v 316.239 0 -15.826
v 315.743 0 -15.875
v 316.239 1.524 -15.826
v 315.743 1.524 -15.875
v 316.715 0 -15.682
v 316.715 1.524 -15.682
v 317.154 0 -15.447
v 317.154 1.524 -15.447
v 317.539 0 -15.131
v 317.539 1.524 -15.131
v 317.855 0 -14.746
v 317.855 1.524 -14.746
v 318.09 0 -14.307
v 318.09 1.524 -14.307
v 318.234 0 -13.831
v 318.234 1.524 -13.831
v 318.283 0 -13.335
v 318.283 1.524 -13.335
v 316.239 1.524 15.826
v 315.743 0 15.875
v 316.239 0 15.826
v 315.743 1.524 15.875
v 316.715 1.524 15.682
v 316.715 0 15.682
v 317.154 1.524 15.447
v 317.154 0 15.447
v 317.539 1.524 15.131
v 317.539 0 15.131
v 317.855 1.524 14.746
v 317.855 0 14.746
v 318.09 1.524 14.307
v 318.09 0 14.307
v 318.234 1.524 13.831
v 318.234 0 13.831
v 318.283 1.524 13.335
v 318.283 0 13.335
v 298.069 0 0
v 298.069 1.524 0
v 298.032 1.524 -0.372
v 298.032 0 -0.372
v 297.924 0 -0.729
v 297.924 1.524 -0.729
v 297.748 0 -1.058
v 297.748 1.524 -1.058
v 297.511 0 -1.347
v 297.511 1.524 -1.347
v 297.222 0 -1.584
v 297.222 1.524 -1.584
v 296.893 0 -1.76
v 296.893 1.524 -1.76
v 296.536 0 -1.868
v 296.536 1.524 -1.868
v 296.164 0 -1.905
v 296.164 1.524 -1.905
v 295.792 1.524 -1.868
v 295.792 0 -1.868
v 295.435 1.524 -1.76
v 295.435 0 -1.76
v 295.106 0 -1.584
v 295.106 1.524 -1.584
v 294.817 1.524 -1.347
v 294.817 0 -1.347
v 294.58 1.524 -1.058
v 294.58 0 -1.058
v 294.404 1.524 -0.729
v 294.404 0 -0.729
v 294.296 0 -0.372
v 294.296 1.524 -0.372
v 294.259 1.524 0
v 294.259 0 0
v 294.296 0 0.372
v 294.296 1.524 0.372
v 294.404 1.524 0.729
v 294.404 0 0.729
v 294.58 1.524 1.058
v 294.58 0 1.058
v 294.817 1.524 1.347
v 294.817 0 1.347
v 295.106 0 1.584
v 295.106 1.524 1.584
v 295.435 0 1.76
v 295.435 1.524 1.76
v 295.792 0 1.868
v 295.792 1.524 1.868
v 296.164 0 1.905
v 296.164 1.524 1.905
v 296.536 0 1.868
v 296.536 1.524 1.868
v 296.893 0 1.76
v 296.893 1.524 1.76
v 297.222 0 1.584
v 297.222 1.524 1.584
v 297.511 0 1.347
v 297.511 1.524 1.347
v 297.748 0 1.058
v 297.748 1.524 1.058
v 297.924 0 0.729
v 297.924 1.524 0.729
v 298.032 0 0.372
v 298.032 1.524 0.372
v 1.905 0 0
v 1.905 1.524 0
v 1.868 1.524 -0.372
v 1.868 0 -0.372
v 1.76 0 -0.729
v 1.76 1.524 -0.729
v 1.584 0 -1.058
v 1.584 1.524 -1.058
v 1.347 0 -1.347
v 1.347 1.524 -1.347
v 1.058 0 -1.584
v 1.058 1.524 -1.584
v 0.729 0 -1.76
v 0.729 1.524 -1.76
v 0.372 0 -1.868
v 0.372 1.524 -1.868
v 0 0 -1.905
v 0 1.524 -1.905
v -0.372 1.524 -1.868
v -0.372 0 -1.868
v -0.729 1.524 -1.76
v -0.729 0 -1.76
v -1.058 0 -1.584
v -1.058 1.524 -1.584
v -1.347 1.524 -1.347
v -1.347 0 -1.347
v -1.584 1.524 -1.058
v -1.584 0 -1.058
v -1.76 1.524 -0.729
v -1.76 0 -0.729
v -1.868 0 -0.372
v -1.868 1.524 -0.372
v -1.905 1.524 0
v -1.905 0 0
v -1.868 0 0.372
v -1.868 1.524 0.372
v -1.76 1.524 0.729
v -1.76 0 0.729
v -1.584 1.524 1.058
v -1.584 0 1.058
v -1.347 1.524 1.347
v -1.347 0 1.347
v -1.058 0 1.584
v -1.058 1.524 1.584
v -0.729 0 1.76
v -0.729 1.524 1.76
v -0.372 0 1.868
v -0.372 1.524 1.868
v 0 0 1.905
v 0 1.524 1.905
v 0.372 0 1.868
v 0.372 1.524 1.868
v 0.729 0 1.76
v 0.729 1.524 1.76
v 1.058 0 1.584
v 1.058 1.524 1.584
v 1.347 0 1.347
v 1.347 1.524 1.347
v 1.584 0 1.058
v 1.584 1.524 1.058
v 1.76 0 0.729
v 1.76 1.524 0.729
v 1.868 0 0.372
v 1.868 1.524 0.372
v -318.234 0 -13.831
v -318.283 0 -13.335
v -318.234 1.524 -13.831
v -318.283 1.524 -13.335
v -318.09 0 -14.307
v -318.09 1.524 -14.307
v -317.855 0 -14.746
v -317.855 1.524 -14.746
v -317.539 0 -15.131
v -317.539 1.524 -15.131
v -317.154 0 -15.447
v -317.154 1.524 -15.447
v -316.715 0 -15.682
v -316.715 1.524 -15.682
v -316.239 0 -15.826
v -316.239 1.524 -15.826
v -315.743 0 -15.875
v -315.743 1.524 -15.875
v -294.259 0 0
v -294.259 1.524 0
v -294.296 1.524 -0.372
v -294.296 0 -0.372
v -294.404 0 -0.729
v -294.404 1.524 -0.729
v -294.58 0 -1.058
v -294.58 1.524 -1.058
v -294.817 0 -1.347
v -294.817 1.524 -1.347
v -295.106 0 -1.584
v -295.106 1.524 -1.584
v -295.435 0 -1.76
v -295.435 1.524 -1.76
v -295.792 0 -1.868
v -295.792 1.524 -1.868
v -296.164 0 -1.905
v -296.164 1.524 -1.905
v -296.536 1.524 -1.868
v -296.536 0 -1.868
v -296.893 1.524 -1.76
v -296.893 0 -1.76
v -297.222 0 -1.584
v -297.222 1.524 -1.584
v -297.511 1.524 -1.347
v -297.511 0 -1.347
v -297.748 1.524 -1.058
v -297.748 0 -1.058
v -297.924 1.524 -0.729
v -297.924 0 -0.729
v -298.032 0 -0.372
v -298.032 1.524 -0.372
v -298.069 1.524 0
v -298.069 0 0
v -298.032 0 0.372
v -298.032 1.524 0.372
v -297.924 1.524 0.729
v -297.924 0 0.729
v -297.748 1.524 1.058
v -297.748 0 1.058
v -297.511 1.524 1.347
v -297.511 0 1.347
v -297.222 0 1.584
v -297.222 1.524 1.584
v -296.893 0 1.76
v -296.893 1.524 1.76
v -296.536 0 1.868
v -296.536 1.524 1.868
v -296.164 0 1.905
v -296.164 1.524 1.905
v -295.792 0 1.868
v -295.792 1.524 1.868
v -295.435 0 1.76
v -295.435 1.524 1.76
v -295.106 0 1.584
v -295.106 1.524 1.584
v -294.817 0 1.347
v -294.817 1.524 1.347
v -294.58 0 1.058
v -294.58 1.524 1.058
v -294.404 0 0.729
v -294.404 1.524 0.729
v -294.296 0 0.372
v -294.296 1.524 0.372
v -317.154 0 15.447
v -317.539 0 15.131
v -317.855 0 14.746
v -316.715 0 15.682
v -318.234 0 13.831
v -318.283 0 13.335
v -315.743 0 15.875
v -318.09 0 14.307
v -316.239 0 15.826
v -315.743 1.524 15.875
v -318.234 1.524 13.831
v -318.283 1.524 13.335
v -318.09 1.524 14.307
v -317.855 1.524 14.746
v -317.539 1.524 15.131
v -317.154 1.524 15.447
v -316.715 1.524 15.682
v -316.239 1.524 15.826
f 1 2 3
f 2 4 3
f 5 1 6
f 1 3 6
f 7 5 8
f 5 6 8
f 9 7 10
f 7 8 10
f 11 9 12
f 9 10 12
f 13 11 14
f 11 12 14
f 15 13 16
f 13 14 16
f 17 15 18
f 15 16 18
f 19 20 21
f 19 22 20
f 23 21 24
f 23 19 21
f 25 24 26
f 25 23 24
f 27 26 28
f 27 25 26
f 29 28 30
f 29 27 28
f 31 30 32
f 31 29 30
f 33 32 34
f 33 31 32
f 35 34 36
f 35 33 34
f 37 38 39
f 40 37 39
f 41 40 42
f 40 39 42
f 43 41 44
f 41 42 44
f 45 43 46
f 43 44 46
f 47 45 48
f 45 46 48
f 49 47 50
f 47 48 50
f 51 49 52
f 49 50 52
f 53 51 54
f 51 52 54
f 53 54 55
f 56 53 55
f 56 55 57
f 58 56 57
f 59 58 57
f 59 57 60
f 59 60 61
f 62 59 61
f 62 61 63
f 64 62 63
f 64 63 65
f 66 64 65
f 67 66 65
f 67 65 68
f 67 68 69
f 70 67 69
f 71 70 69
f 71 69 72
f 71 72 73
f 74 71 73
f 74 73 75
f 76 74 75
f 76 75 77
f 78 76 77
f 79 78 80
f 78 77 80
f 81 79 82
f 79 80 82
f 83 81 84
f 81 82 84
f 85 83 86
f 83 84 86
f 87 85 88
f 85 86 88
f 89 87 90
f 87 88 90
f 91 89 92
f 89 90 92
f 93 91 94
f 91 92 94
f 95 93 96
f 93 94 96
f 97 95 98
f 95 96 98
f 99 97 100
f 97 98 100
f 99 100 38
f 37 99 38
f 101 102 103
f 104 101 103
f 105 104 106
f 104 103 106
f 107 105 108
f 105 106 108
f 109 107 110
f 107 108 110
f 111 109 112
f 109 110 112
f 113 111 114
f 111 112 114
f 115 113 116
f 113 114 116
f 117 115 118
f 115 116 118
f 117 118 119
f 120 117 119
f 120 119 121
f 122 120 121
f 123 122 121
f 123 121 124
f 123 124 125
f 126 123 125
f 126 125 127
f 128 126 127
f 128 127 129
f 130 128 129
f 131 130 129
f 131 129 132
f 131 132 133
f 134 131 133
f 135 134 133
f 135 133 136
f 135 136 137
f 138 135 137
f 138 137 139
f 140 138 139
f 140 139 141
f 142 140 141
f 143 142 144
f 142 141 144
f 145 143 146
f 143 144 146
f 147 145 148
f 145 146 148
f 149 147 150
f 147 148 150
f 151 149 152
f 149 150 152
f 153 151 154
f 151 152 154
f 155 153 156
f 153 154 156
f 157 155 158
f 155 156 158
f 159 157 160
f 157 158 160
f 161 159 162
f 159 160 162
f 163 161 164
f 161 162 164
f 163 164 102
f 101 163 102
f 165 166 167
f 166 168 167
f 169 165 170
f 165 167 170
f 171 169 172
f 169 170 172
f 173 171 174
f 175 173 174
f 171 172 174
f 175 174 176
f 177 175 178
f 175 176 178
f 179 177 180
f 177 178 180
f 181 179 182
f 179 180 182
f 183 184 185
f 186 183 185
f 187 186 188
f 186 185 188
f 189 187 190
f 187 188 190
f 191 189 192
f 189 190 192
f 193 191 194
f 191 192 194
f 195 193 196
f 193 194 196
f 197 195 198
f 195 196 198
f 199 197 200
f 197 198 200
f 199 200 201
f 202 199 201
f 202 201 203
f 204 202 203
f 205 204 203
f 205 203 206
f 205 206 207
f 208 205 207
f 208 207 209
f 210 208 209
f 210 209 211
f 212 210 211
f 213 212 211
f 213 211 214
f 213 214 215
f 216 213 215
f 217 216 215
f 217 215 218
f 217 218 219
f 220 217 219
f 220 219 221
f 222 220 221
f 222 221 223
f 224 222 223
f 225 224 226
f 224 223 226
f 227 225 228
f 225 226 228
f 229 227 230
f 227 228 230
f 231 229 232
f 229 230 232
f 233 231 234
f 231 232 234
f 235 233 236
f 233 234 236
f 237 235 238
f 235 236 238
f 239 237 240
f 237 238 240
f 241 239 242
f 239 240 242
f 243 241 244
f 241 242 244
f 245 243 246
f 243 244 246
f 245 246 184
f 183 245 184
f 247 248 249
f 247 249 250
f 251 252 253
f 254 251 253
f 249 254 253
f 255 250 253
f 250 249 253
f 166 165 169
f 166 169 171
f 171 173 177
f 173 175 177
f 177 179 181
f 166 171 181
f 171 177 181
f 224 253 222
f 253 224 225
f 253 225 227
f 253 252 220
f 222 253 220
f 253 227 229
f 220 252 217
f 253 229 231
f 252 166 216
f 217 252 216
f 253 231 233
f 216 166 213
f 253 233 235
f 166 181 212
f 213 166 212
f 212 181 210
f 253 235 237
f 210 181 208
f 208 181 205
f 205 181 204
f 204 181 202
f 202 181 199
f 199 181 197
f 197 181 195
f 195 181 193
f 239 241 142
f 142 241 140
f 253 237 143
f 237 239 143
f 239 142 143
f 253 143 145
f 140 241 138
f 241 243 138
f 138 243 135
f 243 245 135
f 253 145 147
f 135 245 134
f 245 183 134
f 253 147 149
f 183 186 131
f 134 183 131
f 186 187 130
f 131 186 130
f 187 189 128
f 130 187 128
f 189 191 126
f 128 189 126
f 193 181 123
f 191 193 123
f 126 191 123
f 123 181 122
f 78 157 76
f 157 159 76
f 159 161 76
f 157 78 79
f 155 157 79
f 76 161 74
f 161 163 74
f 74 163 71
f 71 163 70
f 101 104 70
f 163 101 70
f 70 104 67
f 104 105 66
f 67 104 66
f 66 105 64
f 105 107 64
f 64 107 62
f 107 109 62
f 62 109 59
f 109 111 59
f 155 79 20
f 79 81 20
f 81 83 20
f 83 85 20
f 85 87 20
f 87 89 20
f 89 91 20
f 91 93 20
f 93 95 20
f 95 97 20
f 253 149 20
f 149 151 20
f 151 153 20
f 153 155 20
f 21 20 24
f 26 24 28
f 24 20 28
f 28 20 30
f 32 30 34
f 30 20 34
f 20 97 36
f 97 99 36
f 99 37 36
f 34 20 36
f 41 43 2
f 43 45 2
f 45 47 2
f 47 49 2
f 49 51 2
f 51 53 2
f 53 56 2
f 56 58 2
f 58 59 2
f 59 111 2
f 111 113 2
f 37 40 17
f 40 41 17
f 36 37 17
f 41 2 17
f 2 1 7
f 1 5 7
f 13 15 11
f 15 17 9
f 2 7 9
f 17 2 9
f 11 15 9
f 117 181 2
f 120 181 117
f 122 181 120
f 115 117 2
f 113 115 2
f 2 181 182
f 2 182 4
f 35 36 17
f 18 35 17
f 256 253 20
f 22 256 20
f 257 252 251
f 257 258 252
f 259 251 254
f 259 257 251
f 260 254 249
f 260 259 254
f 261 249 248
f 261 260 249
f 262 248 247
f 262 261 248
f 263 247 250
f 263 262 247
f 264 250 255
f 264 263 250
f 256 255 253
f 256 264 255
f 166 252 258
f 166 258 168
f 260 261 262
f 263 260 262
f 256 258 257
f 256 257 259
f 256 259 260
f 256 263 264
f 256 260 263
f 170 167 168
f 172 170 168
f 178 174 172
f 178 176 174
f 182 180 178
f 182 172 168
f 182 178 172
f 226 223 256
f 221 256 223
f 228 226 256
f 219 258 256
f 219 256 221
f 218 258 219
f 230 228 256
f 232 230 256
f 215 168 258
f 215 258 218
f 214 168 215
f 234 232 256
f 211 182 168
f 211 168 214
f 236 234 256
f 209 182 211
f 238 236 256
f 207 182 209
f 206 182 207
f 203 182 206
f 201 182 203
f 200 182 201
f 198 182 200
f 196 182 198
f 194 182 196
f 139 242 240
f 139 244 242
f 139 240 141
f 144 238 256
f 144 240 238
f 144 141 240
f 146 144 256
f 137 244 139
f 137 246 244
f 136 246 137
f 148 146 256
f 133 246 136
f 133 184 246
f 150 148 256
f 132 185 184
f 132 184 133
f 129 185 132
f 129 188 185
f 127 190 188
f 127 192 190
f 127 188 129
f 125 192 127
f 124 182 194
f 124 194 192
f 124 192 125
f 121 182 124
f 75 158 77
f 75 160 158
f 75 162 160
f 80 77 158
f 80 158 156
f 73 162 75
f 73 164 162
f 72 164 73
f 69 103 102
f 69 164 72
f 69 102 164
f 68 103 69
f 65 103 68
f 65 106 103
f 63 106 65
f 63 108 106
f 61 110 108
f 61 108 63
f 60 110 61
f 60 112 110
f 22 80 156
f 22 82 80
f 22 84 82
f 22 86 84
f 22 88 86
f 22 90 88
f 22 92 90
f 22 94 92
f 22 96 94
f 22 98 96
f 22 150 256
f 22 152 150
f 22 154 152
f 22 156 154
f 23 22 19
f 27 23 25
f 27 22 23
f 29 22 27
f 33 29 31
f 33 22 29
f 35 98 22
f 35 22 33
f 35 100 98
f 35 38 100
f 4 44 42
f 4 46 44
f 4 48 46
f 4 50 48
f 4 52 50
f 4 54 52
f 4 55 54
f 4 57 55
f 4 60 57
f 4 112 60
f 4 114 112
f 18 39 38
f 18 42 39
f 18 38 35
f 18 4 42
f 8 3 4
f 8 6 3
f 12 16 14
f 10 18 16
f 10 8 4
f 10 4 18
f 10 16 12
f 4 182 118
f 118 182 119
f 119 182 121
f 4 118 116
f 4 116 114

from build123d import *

# Parameters (mm, degrees)
SKETCH1_W           = 636.566333418
SKETCH1_H           = 31.75
BOSS_EXTRUDE1_DEPTH = 1.524
SKETCH2_R           = 1.905
CUT_EXTRUDE1_DEPTH  = 2.524
FILLET1_R           = 2.54


with BuildPart() as part:
    # Sketch1 → Boss-Extrude1 (new body)
    with BuildSketch(Plane(origin=(0, 0, 0), x_dir=(1, 0, 0), z_dir=(0, 1, 0))):
        Rectangle(SKETCH1_W, SKETCH1_H)
    extrude(amount=BOSS_EXTRUDE1_DEPTH)

    # Sketch2 → Cut-Extrude1 (cut, through all)
    with BuildSketch(Plane(origin=(0, 1.524, 0), x_dir=(1, 0, 0), z_dir=(0, 1, 0))):
        with Locations((-296.164, 0)):
            Circle(SKETCH2_R)
        with Locations((296.164, 0)):
            Circle(SKETCH2_R)
        Circle(SKETCH2_R)
    extrude(amount=-CUT_EXTRUDE1_DEPTH, mode=Mode.SUBTRACT)

    # Fillet1
    fillet1_edges = [part.edges().sort_by_distance(p)[0] for p in [
        (318.283166709, 0.762, 15.875),
        (-318.283166709, 0.762, 15.875),
        (-318.283166709, 0.762, -15.875),
        (318.283166709, 0.762, -15.875),
    ]]
    fillet(fillet1_edges, radius=FILLET1_R)


solid = part.part
